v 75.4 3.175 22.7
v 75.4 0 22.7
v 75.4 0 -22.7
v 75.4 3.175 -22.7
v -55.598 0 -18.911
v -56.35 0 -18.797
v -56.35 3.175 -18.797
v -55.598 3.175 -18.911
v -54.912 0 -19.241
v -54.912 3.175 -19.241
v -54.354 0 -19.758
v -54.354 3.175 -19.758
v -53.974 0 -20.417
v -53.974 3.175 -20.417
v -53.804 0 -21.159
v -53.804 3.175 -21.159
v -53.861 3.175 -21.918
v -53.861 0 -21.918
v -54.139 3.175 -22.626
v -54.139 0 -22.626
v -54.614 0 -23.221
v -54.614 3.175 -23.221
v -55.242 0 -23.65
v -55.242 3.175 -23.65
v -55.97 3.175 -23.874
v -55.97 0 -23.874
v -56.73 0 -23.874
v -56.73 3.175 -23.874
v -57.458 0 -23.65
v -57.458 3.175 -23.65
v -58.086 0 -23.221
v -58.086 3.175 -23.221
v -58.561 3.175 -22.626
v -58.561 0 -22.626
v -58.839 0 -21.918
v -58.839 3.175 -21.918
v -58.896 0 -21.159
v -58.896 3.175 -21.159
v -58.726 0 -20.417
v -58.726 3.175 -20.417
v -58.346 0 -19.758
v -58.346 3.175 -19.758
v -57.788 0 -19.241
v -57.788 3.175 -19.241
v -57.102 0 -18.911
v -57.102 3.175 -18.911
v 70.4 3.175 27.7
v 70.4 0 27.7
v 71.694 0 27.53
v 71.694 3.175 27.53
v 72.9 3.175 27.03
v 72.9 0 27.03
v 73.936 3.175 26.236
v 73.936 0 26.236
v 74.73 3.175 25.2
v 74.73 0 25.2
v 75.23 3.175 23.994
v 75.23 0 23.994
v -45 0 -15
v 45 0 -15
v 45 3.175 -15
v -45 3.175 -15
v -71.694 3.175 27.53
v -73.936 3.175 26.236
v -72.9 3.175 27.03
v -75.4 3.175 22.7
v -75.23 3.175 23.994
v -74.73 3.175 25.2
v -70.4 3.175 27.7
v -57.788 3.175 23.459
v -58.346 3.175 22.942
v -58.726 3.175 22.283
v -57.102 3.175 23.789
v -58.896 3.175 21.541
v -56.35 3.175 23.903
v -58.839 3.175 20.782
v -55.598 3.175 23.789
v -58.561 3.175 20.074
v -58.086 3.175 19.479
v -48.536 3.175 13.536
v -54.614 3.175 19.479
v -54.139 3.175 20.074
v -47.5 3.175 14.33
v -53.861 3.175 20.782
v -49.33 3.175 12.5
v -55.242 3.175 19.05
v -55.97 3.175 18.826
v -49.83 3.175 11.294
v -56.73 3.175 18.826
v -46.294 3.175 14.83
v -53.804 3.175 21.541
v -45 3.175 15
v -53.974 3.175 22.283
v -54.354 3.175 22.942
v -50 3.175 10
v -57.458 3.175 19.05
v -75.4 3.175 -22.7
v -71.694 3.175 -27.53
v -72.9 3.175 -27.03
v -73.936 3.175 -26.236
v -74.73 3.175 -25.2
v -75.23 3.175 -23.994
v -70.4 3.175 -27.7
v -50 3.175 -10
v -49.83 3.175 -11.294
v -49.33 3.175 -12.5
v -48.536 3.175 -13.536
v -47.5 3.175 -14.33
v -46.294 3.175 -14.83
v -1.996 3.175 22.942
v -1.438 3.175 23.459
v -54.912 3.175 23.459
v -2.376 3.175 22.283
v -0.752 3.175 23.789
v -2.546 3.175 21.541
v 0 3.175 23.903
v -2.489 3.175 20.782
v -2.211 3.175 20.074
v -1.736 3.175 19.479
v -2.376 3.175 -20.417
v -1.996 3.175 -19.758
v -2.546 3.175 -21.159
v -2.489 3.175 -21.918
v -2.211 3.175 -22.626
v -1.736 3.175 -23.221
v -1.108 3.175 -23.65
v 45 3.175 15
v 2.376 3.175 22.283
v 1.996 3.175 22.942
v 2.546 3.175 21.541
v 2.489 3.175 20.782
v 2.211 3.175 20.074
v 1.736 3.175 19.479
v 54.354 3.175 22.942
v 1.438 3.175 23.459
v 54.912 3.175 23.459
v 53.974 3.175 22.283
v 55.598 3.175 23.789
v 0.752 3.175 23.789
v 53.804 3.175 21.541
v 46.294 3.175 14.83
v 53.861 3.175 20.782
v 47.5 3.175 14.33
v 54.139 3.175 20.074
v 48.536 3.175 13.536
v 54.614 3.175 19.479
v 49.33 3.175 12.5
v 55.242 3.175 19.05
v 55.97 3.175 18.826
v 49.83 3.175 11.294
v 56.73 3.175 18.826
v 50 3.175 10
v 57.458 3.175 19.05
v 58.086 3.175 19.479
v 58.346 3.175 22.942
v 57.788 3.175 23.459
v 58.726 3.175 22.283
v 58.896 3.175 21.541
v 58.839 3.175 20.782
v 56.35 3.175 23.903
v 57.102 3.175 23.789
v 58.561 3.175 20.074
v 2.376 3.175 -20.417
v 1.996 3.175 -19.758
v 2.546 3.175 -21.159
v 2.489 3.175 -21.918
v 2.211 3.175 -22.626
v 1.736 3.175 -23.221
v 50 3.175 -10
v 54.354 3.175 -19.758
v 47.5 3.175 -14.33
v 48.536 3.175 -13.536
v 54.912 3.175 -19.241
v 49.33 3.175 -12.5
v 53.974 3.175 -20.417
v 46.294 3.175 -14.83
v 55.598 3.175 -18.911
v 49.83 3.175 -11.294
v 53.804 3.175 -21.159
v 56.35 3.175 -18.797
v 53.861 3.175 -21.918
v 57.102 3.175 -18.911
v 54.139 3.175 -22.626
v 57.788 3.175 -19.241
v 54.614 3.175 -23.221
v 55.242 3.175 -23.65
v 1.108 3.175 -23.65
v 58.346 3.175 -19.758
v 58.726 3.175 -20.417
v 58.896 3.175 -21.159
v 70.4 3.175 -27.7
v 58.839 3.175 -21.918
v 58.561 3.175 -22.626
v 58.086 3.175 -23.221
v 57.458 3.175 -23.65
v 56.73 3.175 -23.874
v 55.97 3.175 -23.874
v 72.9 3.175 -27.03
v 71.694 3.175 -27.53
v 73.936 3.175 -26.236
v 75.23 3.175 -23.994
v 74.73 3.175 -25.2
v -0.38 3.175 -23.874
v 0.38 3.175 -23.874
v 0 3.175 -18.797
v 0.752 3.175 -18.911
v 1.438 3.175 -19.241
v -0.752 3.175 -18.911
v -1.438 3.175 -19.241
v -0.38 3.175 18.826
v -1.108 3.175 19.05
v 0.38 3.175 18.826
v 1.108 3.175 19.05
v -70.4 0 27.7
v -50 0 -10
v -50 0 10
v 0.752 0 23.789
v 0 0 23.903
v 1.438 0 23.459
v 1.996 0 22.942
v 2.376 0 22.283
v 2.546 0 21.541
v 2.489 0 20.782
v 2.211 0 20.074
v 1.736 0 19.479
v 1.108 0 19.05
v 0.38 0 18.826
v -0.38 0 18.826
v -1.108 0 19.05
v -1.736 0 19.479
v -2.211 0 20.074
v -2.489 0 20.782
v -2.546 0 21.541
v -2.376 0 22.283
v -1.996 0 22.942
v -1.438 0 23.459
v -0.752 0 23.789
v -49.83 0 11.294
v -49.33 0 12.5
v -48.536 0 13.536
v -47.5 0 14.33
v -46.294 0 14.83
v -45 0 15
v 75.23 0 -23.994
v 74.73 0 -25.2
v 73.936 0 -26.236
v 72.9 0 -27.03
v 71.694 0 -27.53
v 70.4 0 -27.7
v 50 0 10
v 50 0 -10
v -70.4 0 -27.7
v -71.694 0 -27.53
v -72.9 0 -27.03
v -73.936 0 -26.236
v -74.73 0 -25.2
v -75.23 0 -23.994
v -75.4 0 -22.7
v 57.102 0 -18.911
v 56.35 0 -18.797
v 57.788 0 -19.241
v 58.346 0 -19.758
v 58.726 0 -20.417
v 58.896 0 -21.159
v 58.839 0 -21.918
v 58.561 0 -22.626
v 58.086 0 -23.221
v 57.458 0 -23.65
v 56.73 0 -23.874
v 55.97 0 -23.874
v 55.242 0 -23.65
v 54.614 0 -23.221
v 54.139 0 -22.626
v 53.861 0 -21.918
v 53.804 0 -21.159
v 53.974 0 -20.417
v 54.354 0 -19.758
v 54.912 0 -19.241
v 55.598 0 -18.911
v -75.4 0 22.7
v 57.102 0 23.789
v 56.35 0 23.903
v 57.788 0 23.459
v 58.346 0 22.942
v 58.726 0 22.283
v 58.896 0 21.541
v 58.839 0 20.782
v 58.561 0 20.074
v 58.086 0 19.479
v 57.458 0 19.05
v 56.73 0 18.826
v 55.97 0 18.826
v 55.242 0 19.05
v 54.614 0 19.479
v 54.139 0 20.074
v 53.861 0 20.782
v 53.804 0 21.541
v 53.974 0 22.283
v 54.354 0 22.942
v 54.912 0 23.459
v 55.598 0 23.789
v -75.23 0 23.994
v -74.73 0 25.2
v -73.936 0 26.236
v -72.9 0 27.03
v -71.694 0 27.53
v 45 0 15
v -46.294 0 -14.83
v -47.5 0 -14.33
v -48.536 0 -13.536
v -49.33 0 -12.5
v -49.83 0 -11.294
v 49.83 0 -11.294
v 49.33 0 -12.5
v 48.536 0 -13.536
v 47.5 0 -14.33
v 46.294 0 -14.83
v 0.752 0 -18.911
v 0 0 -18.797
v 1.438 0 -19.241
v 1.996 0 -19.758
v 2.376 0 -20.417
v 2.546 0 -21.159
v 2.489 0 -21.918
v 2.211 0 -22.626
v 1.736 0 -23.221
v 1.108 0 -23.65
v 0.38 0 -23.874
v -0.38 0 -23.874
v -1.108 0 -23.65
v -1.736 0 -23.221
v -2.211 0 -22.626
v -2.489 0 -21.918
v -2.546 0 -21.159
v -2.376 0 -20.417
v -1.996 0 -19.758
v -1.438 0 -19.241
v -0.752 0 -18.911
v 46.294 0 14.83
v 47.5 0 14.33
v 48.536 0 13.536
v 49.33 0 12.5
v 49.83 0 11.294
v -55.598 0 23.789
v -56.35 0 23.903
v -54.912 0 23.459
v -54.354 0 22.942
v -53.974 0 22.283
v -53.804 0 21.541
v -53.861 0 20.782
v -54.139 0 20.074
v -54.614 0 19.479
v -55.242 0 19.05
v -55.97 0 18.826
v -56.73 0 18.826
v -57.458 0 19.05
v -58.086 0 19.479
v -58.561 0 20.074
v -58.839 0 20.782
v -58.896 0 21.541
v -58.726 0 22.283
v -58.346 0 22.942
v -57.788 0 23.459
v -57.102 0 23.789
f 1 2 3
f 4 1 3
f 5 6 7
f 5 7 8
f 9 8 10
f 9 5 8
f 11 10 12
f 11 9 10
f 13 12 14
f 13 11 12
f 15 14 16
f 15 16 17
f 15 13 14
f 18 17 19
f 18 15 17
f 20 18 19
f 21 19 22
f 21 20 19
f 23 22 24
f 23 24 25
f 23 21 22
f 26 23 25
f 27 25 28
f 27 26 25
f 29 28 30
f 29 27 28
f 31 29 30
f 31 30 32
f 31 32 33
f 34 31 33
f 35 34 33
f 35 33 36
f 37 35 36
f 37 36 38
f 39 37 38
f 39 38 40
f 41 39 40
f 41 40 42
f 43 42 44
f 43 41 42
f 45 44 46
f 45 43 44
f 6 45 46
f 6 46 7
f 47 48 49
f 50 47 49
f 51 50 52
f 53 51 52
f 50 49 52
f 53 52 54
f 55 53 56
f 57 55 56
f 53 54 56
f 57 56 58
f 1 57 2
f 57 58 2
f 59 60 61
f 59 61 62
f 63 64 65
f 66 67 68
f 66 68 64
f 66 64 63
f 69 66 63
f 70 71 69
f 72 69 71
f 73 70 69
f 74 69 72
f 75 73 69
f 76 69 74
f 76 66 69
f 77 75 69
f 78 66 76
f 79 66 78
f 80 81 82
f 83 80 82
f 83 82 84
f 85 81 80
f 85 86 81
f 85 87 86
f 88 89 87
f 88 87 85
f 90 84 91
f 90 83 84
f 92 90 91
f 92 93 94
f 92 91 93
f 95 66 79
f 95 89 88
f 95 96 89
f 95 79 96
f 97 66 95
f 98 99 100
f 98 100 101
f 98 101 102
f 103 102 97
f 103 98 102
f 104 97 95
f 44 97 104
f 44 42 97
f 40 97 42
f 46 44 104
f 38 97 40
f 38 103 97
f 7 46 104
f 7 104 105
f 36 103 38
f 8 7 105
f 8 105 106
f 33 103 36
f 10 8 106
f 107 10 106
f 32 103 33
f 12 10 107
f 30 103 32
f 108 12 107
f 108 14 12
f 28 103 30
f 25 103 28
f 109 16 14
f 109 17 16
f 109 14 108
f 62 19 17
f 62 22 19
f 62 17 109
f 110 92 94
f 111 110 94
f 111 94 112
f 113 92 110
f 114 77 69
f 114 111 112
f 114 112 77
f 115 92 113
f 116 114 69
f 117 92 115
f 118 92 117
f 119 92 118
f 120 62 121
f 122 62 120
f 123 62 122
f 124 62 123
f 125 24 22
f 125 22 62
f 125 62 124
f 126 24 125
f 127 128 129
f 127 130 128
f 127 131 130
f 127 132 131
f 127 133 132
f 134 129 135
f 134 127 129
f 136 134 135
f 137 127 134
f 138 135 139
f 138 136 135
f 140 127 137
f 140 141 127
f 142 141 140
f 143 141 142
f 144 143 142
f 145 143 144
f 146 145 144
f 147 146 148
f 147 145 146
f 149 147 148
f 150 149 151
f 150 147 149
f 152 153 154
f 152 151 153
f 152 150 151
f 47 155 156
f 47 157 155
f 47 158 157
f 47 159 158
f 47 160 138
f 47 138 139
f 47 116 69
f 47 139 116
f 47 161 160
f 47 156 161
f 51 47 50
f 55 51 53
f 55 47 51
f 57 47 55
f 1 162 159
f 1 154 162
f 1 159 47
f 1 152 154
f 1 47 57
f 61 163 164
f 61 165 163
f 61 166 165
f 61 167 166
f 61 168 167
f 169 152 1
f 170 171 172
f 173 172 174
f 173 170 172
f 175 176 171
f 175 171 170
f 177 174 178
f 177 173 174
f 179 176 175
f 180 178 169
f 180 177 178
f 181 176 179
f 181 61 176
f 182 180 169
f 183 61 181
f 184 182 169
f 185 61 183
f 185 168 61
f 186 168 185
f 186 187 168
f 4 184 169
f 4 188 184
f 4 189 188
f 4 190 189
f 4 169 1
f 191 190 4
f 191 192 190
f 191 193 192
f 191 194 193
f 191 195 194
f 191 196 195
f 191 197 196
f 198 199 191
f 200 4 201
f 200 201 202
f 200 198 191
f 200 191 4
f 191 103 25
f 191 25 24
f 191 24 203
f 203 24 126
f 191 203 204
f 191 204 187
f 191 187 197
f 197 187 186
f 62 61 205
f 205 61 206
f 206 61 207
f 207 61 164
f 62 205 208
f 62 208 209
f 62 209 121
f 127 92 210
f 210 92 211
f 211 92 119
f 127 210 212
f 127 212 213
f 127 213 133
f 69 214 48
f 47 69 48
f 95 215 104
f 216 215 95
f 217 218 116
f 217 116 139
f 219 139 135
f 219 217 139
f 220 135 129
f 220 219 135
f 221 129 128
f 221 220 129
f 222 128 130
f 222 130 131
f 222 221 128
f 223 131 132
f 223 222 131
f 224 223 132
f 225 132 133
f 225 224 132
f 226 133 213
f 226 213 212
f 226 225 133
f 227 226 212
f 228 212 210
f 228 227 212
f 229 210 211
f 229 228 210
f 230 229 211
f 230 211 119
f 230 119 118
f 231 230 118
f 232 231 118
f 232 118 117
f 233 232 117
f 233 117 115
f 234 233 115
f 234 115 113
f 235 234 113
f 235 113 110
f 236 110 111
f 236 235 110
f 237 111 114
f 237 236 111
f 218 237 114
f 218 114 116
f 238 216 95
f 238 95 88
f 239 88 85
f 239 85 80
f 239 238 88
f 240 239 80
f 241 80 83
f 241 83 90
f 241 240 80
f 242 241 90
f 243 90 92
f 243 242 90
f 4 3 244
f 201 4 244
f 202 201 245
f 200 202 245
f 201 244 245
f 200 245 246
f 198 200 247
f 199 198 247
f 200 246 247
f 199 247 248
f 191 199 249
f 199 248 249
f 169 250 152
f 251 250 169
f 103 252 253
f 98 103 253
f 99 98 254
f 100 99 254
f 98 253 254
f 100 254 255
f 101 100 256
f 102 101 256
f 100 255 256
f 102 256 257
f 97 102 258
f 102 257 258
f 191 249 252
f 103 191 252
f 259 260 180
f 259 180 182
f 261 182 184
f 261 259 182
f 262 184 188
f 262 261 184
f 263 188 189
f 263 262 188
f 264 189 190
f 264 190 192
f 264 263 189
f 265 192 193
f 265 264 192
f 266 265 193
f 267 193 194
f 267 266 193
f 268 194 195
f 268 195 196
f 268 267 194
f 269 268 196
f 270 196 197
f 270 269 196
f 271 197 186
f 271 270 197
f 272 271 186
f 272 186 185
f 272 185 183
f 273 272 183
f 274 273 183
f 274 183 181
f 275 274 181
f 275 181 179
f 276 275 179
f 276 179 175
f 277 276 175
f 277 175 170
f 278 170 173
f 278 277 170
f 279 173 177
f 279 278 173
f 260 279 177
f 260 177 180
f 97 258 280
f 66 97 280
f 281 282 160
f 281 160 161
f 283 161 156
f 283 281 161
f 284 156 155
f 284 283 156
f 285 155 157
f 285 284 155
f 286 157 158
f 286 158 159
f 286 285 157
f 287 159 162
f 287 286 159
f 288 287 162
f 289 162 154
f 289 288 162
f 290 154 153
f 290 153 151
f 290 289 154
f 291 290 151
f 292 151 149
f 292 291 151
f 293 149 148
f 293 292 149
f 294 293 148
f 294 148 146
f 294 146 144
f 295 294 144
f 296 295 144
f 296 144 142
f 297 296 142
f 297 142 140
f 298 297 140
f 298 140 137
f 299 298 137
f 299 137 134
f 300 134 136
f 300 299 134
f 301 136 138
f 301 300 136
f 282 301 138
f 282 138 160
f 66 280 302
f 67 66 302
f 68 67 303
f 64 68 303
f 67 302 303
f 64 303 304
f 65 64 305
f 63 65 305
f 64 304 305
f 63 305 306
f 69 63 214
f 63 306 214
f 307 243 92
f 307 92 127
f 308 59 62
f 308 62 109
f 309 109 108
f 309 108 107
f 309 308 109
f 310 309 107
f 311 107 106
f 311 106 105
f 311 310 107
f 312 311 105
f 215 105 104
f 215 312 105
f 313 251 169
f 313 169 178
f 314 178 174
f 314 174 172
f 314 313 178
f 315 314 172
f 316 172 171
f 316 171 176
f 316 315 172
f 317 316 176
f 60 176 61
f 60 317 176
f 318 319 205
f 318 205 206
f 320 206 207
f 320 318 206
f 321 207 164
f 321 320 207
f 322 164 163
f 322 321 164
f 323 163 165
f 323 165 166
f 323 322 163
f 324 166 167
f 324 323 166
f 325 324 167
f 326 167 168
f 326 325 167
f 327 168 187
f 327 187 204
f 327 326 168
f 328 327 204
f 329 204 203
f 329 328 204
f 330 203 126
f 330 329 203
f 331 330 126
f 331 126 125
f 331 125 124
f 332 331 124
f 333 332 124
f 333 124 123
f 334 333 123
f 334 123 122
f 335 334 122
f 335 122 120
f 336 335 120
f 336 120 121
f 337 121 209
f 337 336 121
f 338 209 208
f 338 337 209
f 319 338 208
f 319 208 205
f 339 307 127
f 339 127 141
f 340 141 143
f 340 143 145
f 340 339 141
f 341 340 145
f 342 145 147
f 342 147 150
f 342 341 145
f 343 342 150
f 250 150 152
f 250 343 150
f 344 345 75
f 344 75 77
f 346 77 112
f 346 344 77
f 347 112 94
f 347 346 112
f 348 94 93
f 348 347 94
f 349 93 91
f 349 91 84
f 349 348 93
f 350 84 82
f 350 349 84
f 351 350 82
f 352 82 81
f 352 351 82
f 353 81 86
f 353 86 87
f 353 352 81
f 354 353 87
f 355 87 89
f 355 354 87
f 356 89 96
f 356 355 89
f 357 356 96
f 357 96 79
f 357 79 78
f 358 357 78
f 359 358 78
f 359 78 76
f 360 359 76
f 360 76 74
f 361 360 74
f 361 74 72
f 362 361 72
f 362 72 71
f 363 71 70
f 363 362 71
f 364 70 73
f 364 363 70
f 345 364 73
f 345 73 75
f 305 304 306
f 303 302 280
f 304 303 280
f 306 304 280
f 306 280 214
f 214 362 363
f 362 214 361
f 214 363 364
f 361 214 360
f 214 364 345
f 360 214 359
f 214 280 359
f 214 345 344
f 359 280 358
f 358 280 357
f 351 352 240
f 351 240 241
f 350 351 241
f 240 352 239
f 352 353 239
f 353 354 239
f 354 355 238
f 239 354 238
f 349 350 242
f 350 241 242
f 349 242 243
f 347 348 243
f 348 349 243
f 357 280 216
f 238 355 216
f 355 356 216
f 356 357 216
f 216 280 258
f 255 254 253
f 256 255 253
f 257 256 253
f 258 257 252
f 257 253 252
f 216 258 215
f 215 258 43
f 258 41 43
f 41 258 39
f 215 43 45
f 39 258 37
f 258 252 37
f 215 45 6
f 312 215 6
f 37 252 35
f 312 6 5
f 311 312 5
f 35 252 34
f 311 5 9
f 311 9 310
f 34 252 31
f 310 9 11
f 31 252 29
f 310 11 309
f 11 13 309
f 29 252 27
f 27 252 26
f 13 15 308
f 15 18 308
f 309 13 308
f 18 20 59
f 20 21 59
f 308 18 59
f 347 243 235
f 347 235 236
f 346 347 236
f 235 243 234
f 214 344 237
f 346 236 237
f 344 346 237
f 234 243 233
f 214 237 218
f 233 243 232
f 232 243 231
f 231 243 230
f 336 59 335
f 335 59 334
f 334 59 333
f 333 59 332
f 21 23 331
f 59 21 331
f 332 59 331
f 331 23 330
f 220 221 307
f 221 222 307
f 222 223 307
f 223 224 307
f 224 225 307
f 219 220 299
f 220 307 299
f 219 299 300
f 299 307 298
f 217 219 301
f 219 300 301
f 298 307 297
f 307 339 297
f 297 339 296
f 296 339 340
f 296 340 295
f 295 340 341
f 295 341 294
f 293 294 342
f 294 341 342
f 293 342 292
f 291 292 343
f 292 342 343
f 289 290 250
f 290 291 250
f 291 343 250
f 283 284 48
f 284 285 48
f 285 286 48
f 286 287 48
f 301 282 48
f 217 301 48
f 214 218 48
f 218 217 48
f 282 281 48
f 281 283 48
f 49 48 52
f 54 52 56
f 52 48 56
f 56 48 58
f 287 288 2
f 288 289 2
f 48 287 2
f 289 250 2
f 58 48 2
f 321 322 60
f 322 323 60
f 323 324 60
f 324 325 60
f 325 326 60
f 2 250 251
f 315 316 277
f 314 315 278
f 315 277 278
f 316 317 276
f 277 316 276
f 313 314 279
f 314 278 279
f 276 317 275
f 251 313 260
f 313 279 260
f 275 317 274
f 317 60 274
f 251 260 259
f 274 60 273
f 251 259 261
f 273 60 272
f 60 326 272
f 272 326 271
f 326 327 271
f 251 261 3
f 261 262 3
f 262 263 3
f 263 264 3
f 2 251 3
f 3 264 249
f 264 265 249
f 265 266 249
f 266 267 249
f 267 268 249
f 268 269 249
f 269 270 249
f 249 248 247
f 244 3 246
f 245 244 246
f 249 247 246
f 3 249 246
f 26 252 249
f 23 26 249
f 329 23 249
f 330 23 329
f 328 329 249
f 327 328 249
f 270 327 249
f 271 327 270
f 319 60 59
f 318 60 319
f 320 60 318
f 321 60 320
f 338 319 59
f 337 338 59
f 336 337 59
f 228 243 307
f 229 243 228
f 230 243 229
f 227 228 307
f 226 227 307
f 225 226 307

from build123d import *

# Parameters (mm, degrees)
SKETCH1_R           = 2.5527
BOSS_EXTRUDE1_DEPTH = 3.175


with BuildPart() as part:
    # Sketch1 → Boss-Extrude1 (new body)
    with BuildSketch(Plane(origin=(0, 0, 0), x_dir=(1, 0, 0), z_dir=(0, 1, 0))):
        with BuildLine():
            Line((-75.4, 22.7), (-75.4, 0))
            Line((-75.4, 0), (-75.4, -22.7))
            ThreePointArc((-75.4, -22.7), (-73.935533906, -26.235533906), (-70.4, -27.7))
            Line((-70.4, -27.7), (70.4, -27.7))
            ThreePointArc((70.4, -27.7), (73.935533906, -26.235533906), (75.4, -22.7))
            Line((75.4, -22.7), (75.4, 0))
            Line((75.4, 0), (75.4, 22.7))
            ThreePointArc((75.4, 22.7), (73.935533906, 26.235533906), (70.4, 27.7))
            Line((70.4, 27.7), (-70.4, 27.7))
            ThreePointArc((-70.4, 27.7), (-73.935533906, 26.235533906), (-75.4, 22.7))
        make_face()
        with Locations(Location((-56.35, -21.35, 0), (0, 0, 270))):
            Circle(SKETCH1_R, mode=Mode.SUBTRACT)
        with Locations(Location((0, -21.35, 0), (0, 0, 270))):
            Circle(SKETCH1_R, mode=Mode.SUBTRACT)
        with Locations(Location((56.35, -21.35, 0), (0, 0, 270))):
            Circle(SKETCH1_R, mode=Mode.SUBTRACT)
        with Locations(Location((56.35, 21.35, 0), (0, 0, 270))):
            Circle(SKETCH1_R, mode=Mode.SUBTRACT)
        with Locations(Location((0, 21.35, 0), (0, 0, 270))):
            Circle(SKETCH1_R, mode=Mode.SUBTRACT)
        with Locations(Location((-56.35, 21.35, 0), (0, 0, 270))):
            Circle(SKETCH1_R, mode=Mode.SUBTRACT)
        with BuildLine():
            Line((45, 15), (-45, 15))
            ThreePointArc((-45, 15), (-48.535533906, 13.535533906), (-50, 10))
            Line((-50, 10), (-50, -10))
            ThreePointArc((-50, -10), (-48.535533906, -13.535533906), (-45, -15))
            Line((-45, -15), (45, -15))
            ThreePointArc((45, -15), (48.535533906, -13.535533906), (50, -10))
            Line((50, -10), (50, 10))
            ThreePointArc((50, 10), (48.535533906, 13.535533906), (45, 15))
        make_face(mode=Mode.SUBTRACT)
    extrude(amount=BOSS_EXTRUDE1_DEPTH)


solid = part.part
